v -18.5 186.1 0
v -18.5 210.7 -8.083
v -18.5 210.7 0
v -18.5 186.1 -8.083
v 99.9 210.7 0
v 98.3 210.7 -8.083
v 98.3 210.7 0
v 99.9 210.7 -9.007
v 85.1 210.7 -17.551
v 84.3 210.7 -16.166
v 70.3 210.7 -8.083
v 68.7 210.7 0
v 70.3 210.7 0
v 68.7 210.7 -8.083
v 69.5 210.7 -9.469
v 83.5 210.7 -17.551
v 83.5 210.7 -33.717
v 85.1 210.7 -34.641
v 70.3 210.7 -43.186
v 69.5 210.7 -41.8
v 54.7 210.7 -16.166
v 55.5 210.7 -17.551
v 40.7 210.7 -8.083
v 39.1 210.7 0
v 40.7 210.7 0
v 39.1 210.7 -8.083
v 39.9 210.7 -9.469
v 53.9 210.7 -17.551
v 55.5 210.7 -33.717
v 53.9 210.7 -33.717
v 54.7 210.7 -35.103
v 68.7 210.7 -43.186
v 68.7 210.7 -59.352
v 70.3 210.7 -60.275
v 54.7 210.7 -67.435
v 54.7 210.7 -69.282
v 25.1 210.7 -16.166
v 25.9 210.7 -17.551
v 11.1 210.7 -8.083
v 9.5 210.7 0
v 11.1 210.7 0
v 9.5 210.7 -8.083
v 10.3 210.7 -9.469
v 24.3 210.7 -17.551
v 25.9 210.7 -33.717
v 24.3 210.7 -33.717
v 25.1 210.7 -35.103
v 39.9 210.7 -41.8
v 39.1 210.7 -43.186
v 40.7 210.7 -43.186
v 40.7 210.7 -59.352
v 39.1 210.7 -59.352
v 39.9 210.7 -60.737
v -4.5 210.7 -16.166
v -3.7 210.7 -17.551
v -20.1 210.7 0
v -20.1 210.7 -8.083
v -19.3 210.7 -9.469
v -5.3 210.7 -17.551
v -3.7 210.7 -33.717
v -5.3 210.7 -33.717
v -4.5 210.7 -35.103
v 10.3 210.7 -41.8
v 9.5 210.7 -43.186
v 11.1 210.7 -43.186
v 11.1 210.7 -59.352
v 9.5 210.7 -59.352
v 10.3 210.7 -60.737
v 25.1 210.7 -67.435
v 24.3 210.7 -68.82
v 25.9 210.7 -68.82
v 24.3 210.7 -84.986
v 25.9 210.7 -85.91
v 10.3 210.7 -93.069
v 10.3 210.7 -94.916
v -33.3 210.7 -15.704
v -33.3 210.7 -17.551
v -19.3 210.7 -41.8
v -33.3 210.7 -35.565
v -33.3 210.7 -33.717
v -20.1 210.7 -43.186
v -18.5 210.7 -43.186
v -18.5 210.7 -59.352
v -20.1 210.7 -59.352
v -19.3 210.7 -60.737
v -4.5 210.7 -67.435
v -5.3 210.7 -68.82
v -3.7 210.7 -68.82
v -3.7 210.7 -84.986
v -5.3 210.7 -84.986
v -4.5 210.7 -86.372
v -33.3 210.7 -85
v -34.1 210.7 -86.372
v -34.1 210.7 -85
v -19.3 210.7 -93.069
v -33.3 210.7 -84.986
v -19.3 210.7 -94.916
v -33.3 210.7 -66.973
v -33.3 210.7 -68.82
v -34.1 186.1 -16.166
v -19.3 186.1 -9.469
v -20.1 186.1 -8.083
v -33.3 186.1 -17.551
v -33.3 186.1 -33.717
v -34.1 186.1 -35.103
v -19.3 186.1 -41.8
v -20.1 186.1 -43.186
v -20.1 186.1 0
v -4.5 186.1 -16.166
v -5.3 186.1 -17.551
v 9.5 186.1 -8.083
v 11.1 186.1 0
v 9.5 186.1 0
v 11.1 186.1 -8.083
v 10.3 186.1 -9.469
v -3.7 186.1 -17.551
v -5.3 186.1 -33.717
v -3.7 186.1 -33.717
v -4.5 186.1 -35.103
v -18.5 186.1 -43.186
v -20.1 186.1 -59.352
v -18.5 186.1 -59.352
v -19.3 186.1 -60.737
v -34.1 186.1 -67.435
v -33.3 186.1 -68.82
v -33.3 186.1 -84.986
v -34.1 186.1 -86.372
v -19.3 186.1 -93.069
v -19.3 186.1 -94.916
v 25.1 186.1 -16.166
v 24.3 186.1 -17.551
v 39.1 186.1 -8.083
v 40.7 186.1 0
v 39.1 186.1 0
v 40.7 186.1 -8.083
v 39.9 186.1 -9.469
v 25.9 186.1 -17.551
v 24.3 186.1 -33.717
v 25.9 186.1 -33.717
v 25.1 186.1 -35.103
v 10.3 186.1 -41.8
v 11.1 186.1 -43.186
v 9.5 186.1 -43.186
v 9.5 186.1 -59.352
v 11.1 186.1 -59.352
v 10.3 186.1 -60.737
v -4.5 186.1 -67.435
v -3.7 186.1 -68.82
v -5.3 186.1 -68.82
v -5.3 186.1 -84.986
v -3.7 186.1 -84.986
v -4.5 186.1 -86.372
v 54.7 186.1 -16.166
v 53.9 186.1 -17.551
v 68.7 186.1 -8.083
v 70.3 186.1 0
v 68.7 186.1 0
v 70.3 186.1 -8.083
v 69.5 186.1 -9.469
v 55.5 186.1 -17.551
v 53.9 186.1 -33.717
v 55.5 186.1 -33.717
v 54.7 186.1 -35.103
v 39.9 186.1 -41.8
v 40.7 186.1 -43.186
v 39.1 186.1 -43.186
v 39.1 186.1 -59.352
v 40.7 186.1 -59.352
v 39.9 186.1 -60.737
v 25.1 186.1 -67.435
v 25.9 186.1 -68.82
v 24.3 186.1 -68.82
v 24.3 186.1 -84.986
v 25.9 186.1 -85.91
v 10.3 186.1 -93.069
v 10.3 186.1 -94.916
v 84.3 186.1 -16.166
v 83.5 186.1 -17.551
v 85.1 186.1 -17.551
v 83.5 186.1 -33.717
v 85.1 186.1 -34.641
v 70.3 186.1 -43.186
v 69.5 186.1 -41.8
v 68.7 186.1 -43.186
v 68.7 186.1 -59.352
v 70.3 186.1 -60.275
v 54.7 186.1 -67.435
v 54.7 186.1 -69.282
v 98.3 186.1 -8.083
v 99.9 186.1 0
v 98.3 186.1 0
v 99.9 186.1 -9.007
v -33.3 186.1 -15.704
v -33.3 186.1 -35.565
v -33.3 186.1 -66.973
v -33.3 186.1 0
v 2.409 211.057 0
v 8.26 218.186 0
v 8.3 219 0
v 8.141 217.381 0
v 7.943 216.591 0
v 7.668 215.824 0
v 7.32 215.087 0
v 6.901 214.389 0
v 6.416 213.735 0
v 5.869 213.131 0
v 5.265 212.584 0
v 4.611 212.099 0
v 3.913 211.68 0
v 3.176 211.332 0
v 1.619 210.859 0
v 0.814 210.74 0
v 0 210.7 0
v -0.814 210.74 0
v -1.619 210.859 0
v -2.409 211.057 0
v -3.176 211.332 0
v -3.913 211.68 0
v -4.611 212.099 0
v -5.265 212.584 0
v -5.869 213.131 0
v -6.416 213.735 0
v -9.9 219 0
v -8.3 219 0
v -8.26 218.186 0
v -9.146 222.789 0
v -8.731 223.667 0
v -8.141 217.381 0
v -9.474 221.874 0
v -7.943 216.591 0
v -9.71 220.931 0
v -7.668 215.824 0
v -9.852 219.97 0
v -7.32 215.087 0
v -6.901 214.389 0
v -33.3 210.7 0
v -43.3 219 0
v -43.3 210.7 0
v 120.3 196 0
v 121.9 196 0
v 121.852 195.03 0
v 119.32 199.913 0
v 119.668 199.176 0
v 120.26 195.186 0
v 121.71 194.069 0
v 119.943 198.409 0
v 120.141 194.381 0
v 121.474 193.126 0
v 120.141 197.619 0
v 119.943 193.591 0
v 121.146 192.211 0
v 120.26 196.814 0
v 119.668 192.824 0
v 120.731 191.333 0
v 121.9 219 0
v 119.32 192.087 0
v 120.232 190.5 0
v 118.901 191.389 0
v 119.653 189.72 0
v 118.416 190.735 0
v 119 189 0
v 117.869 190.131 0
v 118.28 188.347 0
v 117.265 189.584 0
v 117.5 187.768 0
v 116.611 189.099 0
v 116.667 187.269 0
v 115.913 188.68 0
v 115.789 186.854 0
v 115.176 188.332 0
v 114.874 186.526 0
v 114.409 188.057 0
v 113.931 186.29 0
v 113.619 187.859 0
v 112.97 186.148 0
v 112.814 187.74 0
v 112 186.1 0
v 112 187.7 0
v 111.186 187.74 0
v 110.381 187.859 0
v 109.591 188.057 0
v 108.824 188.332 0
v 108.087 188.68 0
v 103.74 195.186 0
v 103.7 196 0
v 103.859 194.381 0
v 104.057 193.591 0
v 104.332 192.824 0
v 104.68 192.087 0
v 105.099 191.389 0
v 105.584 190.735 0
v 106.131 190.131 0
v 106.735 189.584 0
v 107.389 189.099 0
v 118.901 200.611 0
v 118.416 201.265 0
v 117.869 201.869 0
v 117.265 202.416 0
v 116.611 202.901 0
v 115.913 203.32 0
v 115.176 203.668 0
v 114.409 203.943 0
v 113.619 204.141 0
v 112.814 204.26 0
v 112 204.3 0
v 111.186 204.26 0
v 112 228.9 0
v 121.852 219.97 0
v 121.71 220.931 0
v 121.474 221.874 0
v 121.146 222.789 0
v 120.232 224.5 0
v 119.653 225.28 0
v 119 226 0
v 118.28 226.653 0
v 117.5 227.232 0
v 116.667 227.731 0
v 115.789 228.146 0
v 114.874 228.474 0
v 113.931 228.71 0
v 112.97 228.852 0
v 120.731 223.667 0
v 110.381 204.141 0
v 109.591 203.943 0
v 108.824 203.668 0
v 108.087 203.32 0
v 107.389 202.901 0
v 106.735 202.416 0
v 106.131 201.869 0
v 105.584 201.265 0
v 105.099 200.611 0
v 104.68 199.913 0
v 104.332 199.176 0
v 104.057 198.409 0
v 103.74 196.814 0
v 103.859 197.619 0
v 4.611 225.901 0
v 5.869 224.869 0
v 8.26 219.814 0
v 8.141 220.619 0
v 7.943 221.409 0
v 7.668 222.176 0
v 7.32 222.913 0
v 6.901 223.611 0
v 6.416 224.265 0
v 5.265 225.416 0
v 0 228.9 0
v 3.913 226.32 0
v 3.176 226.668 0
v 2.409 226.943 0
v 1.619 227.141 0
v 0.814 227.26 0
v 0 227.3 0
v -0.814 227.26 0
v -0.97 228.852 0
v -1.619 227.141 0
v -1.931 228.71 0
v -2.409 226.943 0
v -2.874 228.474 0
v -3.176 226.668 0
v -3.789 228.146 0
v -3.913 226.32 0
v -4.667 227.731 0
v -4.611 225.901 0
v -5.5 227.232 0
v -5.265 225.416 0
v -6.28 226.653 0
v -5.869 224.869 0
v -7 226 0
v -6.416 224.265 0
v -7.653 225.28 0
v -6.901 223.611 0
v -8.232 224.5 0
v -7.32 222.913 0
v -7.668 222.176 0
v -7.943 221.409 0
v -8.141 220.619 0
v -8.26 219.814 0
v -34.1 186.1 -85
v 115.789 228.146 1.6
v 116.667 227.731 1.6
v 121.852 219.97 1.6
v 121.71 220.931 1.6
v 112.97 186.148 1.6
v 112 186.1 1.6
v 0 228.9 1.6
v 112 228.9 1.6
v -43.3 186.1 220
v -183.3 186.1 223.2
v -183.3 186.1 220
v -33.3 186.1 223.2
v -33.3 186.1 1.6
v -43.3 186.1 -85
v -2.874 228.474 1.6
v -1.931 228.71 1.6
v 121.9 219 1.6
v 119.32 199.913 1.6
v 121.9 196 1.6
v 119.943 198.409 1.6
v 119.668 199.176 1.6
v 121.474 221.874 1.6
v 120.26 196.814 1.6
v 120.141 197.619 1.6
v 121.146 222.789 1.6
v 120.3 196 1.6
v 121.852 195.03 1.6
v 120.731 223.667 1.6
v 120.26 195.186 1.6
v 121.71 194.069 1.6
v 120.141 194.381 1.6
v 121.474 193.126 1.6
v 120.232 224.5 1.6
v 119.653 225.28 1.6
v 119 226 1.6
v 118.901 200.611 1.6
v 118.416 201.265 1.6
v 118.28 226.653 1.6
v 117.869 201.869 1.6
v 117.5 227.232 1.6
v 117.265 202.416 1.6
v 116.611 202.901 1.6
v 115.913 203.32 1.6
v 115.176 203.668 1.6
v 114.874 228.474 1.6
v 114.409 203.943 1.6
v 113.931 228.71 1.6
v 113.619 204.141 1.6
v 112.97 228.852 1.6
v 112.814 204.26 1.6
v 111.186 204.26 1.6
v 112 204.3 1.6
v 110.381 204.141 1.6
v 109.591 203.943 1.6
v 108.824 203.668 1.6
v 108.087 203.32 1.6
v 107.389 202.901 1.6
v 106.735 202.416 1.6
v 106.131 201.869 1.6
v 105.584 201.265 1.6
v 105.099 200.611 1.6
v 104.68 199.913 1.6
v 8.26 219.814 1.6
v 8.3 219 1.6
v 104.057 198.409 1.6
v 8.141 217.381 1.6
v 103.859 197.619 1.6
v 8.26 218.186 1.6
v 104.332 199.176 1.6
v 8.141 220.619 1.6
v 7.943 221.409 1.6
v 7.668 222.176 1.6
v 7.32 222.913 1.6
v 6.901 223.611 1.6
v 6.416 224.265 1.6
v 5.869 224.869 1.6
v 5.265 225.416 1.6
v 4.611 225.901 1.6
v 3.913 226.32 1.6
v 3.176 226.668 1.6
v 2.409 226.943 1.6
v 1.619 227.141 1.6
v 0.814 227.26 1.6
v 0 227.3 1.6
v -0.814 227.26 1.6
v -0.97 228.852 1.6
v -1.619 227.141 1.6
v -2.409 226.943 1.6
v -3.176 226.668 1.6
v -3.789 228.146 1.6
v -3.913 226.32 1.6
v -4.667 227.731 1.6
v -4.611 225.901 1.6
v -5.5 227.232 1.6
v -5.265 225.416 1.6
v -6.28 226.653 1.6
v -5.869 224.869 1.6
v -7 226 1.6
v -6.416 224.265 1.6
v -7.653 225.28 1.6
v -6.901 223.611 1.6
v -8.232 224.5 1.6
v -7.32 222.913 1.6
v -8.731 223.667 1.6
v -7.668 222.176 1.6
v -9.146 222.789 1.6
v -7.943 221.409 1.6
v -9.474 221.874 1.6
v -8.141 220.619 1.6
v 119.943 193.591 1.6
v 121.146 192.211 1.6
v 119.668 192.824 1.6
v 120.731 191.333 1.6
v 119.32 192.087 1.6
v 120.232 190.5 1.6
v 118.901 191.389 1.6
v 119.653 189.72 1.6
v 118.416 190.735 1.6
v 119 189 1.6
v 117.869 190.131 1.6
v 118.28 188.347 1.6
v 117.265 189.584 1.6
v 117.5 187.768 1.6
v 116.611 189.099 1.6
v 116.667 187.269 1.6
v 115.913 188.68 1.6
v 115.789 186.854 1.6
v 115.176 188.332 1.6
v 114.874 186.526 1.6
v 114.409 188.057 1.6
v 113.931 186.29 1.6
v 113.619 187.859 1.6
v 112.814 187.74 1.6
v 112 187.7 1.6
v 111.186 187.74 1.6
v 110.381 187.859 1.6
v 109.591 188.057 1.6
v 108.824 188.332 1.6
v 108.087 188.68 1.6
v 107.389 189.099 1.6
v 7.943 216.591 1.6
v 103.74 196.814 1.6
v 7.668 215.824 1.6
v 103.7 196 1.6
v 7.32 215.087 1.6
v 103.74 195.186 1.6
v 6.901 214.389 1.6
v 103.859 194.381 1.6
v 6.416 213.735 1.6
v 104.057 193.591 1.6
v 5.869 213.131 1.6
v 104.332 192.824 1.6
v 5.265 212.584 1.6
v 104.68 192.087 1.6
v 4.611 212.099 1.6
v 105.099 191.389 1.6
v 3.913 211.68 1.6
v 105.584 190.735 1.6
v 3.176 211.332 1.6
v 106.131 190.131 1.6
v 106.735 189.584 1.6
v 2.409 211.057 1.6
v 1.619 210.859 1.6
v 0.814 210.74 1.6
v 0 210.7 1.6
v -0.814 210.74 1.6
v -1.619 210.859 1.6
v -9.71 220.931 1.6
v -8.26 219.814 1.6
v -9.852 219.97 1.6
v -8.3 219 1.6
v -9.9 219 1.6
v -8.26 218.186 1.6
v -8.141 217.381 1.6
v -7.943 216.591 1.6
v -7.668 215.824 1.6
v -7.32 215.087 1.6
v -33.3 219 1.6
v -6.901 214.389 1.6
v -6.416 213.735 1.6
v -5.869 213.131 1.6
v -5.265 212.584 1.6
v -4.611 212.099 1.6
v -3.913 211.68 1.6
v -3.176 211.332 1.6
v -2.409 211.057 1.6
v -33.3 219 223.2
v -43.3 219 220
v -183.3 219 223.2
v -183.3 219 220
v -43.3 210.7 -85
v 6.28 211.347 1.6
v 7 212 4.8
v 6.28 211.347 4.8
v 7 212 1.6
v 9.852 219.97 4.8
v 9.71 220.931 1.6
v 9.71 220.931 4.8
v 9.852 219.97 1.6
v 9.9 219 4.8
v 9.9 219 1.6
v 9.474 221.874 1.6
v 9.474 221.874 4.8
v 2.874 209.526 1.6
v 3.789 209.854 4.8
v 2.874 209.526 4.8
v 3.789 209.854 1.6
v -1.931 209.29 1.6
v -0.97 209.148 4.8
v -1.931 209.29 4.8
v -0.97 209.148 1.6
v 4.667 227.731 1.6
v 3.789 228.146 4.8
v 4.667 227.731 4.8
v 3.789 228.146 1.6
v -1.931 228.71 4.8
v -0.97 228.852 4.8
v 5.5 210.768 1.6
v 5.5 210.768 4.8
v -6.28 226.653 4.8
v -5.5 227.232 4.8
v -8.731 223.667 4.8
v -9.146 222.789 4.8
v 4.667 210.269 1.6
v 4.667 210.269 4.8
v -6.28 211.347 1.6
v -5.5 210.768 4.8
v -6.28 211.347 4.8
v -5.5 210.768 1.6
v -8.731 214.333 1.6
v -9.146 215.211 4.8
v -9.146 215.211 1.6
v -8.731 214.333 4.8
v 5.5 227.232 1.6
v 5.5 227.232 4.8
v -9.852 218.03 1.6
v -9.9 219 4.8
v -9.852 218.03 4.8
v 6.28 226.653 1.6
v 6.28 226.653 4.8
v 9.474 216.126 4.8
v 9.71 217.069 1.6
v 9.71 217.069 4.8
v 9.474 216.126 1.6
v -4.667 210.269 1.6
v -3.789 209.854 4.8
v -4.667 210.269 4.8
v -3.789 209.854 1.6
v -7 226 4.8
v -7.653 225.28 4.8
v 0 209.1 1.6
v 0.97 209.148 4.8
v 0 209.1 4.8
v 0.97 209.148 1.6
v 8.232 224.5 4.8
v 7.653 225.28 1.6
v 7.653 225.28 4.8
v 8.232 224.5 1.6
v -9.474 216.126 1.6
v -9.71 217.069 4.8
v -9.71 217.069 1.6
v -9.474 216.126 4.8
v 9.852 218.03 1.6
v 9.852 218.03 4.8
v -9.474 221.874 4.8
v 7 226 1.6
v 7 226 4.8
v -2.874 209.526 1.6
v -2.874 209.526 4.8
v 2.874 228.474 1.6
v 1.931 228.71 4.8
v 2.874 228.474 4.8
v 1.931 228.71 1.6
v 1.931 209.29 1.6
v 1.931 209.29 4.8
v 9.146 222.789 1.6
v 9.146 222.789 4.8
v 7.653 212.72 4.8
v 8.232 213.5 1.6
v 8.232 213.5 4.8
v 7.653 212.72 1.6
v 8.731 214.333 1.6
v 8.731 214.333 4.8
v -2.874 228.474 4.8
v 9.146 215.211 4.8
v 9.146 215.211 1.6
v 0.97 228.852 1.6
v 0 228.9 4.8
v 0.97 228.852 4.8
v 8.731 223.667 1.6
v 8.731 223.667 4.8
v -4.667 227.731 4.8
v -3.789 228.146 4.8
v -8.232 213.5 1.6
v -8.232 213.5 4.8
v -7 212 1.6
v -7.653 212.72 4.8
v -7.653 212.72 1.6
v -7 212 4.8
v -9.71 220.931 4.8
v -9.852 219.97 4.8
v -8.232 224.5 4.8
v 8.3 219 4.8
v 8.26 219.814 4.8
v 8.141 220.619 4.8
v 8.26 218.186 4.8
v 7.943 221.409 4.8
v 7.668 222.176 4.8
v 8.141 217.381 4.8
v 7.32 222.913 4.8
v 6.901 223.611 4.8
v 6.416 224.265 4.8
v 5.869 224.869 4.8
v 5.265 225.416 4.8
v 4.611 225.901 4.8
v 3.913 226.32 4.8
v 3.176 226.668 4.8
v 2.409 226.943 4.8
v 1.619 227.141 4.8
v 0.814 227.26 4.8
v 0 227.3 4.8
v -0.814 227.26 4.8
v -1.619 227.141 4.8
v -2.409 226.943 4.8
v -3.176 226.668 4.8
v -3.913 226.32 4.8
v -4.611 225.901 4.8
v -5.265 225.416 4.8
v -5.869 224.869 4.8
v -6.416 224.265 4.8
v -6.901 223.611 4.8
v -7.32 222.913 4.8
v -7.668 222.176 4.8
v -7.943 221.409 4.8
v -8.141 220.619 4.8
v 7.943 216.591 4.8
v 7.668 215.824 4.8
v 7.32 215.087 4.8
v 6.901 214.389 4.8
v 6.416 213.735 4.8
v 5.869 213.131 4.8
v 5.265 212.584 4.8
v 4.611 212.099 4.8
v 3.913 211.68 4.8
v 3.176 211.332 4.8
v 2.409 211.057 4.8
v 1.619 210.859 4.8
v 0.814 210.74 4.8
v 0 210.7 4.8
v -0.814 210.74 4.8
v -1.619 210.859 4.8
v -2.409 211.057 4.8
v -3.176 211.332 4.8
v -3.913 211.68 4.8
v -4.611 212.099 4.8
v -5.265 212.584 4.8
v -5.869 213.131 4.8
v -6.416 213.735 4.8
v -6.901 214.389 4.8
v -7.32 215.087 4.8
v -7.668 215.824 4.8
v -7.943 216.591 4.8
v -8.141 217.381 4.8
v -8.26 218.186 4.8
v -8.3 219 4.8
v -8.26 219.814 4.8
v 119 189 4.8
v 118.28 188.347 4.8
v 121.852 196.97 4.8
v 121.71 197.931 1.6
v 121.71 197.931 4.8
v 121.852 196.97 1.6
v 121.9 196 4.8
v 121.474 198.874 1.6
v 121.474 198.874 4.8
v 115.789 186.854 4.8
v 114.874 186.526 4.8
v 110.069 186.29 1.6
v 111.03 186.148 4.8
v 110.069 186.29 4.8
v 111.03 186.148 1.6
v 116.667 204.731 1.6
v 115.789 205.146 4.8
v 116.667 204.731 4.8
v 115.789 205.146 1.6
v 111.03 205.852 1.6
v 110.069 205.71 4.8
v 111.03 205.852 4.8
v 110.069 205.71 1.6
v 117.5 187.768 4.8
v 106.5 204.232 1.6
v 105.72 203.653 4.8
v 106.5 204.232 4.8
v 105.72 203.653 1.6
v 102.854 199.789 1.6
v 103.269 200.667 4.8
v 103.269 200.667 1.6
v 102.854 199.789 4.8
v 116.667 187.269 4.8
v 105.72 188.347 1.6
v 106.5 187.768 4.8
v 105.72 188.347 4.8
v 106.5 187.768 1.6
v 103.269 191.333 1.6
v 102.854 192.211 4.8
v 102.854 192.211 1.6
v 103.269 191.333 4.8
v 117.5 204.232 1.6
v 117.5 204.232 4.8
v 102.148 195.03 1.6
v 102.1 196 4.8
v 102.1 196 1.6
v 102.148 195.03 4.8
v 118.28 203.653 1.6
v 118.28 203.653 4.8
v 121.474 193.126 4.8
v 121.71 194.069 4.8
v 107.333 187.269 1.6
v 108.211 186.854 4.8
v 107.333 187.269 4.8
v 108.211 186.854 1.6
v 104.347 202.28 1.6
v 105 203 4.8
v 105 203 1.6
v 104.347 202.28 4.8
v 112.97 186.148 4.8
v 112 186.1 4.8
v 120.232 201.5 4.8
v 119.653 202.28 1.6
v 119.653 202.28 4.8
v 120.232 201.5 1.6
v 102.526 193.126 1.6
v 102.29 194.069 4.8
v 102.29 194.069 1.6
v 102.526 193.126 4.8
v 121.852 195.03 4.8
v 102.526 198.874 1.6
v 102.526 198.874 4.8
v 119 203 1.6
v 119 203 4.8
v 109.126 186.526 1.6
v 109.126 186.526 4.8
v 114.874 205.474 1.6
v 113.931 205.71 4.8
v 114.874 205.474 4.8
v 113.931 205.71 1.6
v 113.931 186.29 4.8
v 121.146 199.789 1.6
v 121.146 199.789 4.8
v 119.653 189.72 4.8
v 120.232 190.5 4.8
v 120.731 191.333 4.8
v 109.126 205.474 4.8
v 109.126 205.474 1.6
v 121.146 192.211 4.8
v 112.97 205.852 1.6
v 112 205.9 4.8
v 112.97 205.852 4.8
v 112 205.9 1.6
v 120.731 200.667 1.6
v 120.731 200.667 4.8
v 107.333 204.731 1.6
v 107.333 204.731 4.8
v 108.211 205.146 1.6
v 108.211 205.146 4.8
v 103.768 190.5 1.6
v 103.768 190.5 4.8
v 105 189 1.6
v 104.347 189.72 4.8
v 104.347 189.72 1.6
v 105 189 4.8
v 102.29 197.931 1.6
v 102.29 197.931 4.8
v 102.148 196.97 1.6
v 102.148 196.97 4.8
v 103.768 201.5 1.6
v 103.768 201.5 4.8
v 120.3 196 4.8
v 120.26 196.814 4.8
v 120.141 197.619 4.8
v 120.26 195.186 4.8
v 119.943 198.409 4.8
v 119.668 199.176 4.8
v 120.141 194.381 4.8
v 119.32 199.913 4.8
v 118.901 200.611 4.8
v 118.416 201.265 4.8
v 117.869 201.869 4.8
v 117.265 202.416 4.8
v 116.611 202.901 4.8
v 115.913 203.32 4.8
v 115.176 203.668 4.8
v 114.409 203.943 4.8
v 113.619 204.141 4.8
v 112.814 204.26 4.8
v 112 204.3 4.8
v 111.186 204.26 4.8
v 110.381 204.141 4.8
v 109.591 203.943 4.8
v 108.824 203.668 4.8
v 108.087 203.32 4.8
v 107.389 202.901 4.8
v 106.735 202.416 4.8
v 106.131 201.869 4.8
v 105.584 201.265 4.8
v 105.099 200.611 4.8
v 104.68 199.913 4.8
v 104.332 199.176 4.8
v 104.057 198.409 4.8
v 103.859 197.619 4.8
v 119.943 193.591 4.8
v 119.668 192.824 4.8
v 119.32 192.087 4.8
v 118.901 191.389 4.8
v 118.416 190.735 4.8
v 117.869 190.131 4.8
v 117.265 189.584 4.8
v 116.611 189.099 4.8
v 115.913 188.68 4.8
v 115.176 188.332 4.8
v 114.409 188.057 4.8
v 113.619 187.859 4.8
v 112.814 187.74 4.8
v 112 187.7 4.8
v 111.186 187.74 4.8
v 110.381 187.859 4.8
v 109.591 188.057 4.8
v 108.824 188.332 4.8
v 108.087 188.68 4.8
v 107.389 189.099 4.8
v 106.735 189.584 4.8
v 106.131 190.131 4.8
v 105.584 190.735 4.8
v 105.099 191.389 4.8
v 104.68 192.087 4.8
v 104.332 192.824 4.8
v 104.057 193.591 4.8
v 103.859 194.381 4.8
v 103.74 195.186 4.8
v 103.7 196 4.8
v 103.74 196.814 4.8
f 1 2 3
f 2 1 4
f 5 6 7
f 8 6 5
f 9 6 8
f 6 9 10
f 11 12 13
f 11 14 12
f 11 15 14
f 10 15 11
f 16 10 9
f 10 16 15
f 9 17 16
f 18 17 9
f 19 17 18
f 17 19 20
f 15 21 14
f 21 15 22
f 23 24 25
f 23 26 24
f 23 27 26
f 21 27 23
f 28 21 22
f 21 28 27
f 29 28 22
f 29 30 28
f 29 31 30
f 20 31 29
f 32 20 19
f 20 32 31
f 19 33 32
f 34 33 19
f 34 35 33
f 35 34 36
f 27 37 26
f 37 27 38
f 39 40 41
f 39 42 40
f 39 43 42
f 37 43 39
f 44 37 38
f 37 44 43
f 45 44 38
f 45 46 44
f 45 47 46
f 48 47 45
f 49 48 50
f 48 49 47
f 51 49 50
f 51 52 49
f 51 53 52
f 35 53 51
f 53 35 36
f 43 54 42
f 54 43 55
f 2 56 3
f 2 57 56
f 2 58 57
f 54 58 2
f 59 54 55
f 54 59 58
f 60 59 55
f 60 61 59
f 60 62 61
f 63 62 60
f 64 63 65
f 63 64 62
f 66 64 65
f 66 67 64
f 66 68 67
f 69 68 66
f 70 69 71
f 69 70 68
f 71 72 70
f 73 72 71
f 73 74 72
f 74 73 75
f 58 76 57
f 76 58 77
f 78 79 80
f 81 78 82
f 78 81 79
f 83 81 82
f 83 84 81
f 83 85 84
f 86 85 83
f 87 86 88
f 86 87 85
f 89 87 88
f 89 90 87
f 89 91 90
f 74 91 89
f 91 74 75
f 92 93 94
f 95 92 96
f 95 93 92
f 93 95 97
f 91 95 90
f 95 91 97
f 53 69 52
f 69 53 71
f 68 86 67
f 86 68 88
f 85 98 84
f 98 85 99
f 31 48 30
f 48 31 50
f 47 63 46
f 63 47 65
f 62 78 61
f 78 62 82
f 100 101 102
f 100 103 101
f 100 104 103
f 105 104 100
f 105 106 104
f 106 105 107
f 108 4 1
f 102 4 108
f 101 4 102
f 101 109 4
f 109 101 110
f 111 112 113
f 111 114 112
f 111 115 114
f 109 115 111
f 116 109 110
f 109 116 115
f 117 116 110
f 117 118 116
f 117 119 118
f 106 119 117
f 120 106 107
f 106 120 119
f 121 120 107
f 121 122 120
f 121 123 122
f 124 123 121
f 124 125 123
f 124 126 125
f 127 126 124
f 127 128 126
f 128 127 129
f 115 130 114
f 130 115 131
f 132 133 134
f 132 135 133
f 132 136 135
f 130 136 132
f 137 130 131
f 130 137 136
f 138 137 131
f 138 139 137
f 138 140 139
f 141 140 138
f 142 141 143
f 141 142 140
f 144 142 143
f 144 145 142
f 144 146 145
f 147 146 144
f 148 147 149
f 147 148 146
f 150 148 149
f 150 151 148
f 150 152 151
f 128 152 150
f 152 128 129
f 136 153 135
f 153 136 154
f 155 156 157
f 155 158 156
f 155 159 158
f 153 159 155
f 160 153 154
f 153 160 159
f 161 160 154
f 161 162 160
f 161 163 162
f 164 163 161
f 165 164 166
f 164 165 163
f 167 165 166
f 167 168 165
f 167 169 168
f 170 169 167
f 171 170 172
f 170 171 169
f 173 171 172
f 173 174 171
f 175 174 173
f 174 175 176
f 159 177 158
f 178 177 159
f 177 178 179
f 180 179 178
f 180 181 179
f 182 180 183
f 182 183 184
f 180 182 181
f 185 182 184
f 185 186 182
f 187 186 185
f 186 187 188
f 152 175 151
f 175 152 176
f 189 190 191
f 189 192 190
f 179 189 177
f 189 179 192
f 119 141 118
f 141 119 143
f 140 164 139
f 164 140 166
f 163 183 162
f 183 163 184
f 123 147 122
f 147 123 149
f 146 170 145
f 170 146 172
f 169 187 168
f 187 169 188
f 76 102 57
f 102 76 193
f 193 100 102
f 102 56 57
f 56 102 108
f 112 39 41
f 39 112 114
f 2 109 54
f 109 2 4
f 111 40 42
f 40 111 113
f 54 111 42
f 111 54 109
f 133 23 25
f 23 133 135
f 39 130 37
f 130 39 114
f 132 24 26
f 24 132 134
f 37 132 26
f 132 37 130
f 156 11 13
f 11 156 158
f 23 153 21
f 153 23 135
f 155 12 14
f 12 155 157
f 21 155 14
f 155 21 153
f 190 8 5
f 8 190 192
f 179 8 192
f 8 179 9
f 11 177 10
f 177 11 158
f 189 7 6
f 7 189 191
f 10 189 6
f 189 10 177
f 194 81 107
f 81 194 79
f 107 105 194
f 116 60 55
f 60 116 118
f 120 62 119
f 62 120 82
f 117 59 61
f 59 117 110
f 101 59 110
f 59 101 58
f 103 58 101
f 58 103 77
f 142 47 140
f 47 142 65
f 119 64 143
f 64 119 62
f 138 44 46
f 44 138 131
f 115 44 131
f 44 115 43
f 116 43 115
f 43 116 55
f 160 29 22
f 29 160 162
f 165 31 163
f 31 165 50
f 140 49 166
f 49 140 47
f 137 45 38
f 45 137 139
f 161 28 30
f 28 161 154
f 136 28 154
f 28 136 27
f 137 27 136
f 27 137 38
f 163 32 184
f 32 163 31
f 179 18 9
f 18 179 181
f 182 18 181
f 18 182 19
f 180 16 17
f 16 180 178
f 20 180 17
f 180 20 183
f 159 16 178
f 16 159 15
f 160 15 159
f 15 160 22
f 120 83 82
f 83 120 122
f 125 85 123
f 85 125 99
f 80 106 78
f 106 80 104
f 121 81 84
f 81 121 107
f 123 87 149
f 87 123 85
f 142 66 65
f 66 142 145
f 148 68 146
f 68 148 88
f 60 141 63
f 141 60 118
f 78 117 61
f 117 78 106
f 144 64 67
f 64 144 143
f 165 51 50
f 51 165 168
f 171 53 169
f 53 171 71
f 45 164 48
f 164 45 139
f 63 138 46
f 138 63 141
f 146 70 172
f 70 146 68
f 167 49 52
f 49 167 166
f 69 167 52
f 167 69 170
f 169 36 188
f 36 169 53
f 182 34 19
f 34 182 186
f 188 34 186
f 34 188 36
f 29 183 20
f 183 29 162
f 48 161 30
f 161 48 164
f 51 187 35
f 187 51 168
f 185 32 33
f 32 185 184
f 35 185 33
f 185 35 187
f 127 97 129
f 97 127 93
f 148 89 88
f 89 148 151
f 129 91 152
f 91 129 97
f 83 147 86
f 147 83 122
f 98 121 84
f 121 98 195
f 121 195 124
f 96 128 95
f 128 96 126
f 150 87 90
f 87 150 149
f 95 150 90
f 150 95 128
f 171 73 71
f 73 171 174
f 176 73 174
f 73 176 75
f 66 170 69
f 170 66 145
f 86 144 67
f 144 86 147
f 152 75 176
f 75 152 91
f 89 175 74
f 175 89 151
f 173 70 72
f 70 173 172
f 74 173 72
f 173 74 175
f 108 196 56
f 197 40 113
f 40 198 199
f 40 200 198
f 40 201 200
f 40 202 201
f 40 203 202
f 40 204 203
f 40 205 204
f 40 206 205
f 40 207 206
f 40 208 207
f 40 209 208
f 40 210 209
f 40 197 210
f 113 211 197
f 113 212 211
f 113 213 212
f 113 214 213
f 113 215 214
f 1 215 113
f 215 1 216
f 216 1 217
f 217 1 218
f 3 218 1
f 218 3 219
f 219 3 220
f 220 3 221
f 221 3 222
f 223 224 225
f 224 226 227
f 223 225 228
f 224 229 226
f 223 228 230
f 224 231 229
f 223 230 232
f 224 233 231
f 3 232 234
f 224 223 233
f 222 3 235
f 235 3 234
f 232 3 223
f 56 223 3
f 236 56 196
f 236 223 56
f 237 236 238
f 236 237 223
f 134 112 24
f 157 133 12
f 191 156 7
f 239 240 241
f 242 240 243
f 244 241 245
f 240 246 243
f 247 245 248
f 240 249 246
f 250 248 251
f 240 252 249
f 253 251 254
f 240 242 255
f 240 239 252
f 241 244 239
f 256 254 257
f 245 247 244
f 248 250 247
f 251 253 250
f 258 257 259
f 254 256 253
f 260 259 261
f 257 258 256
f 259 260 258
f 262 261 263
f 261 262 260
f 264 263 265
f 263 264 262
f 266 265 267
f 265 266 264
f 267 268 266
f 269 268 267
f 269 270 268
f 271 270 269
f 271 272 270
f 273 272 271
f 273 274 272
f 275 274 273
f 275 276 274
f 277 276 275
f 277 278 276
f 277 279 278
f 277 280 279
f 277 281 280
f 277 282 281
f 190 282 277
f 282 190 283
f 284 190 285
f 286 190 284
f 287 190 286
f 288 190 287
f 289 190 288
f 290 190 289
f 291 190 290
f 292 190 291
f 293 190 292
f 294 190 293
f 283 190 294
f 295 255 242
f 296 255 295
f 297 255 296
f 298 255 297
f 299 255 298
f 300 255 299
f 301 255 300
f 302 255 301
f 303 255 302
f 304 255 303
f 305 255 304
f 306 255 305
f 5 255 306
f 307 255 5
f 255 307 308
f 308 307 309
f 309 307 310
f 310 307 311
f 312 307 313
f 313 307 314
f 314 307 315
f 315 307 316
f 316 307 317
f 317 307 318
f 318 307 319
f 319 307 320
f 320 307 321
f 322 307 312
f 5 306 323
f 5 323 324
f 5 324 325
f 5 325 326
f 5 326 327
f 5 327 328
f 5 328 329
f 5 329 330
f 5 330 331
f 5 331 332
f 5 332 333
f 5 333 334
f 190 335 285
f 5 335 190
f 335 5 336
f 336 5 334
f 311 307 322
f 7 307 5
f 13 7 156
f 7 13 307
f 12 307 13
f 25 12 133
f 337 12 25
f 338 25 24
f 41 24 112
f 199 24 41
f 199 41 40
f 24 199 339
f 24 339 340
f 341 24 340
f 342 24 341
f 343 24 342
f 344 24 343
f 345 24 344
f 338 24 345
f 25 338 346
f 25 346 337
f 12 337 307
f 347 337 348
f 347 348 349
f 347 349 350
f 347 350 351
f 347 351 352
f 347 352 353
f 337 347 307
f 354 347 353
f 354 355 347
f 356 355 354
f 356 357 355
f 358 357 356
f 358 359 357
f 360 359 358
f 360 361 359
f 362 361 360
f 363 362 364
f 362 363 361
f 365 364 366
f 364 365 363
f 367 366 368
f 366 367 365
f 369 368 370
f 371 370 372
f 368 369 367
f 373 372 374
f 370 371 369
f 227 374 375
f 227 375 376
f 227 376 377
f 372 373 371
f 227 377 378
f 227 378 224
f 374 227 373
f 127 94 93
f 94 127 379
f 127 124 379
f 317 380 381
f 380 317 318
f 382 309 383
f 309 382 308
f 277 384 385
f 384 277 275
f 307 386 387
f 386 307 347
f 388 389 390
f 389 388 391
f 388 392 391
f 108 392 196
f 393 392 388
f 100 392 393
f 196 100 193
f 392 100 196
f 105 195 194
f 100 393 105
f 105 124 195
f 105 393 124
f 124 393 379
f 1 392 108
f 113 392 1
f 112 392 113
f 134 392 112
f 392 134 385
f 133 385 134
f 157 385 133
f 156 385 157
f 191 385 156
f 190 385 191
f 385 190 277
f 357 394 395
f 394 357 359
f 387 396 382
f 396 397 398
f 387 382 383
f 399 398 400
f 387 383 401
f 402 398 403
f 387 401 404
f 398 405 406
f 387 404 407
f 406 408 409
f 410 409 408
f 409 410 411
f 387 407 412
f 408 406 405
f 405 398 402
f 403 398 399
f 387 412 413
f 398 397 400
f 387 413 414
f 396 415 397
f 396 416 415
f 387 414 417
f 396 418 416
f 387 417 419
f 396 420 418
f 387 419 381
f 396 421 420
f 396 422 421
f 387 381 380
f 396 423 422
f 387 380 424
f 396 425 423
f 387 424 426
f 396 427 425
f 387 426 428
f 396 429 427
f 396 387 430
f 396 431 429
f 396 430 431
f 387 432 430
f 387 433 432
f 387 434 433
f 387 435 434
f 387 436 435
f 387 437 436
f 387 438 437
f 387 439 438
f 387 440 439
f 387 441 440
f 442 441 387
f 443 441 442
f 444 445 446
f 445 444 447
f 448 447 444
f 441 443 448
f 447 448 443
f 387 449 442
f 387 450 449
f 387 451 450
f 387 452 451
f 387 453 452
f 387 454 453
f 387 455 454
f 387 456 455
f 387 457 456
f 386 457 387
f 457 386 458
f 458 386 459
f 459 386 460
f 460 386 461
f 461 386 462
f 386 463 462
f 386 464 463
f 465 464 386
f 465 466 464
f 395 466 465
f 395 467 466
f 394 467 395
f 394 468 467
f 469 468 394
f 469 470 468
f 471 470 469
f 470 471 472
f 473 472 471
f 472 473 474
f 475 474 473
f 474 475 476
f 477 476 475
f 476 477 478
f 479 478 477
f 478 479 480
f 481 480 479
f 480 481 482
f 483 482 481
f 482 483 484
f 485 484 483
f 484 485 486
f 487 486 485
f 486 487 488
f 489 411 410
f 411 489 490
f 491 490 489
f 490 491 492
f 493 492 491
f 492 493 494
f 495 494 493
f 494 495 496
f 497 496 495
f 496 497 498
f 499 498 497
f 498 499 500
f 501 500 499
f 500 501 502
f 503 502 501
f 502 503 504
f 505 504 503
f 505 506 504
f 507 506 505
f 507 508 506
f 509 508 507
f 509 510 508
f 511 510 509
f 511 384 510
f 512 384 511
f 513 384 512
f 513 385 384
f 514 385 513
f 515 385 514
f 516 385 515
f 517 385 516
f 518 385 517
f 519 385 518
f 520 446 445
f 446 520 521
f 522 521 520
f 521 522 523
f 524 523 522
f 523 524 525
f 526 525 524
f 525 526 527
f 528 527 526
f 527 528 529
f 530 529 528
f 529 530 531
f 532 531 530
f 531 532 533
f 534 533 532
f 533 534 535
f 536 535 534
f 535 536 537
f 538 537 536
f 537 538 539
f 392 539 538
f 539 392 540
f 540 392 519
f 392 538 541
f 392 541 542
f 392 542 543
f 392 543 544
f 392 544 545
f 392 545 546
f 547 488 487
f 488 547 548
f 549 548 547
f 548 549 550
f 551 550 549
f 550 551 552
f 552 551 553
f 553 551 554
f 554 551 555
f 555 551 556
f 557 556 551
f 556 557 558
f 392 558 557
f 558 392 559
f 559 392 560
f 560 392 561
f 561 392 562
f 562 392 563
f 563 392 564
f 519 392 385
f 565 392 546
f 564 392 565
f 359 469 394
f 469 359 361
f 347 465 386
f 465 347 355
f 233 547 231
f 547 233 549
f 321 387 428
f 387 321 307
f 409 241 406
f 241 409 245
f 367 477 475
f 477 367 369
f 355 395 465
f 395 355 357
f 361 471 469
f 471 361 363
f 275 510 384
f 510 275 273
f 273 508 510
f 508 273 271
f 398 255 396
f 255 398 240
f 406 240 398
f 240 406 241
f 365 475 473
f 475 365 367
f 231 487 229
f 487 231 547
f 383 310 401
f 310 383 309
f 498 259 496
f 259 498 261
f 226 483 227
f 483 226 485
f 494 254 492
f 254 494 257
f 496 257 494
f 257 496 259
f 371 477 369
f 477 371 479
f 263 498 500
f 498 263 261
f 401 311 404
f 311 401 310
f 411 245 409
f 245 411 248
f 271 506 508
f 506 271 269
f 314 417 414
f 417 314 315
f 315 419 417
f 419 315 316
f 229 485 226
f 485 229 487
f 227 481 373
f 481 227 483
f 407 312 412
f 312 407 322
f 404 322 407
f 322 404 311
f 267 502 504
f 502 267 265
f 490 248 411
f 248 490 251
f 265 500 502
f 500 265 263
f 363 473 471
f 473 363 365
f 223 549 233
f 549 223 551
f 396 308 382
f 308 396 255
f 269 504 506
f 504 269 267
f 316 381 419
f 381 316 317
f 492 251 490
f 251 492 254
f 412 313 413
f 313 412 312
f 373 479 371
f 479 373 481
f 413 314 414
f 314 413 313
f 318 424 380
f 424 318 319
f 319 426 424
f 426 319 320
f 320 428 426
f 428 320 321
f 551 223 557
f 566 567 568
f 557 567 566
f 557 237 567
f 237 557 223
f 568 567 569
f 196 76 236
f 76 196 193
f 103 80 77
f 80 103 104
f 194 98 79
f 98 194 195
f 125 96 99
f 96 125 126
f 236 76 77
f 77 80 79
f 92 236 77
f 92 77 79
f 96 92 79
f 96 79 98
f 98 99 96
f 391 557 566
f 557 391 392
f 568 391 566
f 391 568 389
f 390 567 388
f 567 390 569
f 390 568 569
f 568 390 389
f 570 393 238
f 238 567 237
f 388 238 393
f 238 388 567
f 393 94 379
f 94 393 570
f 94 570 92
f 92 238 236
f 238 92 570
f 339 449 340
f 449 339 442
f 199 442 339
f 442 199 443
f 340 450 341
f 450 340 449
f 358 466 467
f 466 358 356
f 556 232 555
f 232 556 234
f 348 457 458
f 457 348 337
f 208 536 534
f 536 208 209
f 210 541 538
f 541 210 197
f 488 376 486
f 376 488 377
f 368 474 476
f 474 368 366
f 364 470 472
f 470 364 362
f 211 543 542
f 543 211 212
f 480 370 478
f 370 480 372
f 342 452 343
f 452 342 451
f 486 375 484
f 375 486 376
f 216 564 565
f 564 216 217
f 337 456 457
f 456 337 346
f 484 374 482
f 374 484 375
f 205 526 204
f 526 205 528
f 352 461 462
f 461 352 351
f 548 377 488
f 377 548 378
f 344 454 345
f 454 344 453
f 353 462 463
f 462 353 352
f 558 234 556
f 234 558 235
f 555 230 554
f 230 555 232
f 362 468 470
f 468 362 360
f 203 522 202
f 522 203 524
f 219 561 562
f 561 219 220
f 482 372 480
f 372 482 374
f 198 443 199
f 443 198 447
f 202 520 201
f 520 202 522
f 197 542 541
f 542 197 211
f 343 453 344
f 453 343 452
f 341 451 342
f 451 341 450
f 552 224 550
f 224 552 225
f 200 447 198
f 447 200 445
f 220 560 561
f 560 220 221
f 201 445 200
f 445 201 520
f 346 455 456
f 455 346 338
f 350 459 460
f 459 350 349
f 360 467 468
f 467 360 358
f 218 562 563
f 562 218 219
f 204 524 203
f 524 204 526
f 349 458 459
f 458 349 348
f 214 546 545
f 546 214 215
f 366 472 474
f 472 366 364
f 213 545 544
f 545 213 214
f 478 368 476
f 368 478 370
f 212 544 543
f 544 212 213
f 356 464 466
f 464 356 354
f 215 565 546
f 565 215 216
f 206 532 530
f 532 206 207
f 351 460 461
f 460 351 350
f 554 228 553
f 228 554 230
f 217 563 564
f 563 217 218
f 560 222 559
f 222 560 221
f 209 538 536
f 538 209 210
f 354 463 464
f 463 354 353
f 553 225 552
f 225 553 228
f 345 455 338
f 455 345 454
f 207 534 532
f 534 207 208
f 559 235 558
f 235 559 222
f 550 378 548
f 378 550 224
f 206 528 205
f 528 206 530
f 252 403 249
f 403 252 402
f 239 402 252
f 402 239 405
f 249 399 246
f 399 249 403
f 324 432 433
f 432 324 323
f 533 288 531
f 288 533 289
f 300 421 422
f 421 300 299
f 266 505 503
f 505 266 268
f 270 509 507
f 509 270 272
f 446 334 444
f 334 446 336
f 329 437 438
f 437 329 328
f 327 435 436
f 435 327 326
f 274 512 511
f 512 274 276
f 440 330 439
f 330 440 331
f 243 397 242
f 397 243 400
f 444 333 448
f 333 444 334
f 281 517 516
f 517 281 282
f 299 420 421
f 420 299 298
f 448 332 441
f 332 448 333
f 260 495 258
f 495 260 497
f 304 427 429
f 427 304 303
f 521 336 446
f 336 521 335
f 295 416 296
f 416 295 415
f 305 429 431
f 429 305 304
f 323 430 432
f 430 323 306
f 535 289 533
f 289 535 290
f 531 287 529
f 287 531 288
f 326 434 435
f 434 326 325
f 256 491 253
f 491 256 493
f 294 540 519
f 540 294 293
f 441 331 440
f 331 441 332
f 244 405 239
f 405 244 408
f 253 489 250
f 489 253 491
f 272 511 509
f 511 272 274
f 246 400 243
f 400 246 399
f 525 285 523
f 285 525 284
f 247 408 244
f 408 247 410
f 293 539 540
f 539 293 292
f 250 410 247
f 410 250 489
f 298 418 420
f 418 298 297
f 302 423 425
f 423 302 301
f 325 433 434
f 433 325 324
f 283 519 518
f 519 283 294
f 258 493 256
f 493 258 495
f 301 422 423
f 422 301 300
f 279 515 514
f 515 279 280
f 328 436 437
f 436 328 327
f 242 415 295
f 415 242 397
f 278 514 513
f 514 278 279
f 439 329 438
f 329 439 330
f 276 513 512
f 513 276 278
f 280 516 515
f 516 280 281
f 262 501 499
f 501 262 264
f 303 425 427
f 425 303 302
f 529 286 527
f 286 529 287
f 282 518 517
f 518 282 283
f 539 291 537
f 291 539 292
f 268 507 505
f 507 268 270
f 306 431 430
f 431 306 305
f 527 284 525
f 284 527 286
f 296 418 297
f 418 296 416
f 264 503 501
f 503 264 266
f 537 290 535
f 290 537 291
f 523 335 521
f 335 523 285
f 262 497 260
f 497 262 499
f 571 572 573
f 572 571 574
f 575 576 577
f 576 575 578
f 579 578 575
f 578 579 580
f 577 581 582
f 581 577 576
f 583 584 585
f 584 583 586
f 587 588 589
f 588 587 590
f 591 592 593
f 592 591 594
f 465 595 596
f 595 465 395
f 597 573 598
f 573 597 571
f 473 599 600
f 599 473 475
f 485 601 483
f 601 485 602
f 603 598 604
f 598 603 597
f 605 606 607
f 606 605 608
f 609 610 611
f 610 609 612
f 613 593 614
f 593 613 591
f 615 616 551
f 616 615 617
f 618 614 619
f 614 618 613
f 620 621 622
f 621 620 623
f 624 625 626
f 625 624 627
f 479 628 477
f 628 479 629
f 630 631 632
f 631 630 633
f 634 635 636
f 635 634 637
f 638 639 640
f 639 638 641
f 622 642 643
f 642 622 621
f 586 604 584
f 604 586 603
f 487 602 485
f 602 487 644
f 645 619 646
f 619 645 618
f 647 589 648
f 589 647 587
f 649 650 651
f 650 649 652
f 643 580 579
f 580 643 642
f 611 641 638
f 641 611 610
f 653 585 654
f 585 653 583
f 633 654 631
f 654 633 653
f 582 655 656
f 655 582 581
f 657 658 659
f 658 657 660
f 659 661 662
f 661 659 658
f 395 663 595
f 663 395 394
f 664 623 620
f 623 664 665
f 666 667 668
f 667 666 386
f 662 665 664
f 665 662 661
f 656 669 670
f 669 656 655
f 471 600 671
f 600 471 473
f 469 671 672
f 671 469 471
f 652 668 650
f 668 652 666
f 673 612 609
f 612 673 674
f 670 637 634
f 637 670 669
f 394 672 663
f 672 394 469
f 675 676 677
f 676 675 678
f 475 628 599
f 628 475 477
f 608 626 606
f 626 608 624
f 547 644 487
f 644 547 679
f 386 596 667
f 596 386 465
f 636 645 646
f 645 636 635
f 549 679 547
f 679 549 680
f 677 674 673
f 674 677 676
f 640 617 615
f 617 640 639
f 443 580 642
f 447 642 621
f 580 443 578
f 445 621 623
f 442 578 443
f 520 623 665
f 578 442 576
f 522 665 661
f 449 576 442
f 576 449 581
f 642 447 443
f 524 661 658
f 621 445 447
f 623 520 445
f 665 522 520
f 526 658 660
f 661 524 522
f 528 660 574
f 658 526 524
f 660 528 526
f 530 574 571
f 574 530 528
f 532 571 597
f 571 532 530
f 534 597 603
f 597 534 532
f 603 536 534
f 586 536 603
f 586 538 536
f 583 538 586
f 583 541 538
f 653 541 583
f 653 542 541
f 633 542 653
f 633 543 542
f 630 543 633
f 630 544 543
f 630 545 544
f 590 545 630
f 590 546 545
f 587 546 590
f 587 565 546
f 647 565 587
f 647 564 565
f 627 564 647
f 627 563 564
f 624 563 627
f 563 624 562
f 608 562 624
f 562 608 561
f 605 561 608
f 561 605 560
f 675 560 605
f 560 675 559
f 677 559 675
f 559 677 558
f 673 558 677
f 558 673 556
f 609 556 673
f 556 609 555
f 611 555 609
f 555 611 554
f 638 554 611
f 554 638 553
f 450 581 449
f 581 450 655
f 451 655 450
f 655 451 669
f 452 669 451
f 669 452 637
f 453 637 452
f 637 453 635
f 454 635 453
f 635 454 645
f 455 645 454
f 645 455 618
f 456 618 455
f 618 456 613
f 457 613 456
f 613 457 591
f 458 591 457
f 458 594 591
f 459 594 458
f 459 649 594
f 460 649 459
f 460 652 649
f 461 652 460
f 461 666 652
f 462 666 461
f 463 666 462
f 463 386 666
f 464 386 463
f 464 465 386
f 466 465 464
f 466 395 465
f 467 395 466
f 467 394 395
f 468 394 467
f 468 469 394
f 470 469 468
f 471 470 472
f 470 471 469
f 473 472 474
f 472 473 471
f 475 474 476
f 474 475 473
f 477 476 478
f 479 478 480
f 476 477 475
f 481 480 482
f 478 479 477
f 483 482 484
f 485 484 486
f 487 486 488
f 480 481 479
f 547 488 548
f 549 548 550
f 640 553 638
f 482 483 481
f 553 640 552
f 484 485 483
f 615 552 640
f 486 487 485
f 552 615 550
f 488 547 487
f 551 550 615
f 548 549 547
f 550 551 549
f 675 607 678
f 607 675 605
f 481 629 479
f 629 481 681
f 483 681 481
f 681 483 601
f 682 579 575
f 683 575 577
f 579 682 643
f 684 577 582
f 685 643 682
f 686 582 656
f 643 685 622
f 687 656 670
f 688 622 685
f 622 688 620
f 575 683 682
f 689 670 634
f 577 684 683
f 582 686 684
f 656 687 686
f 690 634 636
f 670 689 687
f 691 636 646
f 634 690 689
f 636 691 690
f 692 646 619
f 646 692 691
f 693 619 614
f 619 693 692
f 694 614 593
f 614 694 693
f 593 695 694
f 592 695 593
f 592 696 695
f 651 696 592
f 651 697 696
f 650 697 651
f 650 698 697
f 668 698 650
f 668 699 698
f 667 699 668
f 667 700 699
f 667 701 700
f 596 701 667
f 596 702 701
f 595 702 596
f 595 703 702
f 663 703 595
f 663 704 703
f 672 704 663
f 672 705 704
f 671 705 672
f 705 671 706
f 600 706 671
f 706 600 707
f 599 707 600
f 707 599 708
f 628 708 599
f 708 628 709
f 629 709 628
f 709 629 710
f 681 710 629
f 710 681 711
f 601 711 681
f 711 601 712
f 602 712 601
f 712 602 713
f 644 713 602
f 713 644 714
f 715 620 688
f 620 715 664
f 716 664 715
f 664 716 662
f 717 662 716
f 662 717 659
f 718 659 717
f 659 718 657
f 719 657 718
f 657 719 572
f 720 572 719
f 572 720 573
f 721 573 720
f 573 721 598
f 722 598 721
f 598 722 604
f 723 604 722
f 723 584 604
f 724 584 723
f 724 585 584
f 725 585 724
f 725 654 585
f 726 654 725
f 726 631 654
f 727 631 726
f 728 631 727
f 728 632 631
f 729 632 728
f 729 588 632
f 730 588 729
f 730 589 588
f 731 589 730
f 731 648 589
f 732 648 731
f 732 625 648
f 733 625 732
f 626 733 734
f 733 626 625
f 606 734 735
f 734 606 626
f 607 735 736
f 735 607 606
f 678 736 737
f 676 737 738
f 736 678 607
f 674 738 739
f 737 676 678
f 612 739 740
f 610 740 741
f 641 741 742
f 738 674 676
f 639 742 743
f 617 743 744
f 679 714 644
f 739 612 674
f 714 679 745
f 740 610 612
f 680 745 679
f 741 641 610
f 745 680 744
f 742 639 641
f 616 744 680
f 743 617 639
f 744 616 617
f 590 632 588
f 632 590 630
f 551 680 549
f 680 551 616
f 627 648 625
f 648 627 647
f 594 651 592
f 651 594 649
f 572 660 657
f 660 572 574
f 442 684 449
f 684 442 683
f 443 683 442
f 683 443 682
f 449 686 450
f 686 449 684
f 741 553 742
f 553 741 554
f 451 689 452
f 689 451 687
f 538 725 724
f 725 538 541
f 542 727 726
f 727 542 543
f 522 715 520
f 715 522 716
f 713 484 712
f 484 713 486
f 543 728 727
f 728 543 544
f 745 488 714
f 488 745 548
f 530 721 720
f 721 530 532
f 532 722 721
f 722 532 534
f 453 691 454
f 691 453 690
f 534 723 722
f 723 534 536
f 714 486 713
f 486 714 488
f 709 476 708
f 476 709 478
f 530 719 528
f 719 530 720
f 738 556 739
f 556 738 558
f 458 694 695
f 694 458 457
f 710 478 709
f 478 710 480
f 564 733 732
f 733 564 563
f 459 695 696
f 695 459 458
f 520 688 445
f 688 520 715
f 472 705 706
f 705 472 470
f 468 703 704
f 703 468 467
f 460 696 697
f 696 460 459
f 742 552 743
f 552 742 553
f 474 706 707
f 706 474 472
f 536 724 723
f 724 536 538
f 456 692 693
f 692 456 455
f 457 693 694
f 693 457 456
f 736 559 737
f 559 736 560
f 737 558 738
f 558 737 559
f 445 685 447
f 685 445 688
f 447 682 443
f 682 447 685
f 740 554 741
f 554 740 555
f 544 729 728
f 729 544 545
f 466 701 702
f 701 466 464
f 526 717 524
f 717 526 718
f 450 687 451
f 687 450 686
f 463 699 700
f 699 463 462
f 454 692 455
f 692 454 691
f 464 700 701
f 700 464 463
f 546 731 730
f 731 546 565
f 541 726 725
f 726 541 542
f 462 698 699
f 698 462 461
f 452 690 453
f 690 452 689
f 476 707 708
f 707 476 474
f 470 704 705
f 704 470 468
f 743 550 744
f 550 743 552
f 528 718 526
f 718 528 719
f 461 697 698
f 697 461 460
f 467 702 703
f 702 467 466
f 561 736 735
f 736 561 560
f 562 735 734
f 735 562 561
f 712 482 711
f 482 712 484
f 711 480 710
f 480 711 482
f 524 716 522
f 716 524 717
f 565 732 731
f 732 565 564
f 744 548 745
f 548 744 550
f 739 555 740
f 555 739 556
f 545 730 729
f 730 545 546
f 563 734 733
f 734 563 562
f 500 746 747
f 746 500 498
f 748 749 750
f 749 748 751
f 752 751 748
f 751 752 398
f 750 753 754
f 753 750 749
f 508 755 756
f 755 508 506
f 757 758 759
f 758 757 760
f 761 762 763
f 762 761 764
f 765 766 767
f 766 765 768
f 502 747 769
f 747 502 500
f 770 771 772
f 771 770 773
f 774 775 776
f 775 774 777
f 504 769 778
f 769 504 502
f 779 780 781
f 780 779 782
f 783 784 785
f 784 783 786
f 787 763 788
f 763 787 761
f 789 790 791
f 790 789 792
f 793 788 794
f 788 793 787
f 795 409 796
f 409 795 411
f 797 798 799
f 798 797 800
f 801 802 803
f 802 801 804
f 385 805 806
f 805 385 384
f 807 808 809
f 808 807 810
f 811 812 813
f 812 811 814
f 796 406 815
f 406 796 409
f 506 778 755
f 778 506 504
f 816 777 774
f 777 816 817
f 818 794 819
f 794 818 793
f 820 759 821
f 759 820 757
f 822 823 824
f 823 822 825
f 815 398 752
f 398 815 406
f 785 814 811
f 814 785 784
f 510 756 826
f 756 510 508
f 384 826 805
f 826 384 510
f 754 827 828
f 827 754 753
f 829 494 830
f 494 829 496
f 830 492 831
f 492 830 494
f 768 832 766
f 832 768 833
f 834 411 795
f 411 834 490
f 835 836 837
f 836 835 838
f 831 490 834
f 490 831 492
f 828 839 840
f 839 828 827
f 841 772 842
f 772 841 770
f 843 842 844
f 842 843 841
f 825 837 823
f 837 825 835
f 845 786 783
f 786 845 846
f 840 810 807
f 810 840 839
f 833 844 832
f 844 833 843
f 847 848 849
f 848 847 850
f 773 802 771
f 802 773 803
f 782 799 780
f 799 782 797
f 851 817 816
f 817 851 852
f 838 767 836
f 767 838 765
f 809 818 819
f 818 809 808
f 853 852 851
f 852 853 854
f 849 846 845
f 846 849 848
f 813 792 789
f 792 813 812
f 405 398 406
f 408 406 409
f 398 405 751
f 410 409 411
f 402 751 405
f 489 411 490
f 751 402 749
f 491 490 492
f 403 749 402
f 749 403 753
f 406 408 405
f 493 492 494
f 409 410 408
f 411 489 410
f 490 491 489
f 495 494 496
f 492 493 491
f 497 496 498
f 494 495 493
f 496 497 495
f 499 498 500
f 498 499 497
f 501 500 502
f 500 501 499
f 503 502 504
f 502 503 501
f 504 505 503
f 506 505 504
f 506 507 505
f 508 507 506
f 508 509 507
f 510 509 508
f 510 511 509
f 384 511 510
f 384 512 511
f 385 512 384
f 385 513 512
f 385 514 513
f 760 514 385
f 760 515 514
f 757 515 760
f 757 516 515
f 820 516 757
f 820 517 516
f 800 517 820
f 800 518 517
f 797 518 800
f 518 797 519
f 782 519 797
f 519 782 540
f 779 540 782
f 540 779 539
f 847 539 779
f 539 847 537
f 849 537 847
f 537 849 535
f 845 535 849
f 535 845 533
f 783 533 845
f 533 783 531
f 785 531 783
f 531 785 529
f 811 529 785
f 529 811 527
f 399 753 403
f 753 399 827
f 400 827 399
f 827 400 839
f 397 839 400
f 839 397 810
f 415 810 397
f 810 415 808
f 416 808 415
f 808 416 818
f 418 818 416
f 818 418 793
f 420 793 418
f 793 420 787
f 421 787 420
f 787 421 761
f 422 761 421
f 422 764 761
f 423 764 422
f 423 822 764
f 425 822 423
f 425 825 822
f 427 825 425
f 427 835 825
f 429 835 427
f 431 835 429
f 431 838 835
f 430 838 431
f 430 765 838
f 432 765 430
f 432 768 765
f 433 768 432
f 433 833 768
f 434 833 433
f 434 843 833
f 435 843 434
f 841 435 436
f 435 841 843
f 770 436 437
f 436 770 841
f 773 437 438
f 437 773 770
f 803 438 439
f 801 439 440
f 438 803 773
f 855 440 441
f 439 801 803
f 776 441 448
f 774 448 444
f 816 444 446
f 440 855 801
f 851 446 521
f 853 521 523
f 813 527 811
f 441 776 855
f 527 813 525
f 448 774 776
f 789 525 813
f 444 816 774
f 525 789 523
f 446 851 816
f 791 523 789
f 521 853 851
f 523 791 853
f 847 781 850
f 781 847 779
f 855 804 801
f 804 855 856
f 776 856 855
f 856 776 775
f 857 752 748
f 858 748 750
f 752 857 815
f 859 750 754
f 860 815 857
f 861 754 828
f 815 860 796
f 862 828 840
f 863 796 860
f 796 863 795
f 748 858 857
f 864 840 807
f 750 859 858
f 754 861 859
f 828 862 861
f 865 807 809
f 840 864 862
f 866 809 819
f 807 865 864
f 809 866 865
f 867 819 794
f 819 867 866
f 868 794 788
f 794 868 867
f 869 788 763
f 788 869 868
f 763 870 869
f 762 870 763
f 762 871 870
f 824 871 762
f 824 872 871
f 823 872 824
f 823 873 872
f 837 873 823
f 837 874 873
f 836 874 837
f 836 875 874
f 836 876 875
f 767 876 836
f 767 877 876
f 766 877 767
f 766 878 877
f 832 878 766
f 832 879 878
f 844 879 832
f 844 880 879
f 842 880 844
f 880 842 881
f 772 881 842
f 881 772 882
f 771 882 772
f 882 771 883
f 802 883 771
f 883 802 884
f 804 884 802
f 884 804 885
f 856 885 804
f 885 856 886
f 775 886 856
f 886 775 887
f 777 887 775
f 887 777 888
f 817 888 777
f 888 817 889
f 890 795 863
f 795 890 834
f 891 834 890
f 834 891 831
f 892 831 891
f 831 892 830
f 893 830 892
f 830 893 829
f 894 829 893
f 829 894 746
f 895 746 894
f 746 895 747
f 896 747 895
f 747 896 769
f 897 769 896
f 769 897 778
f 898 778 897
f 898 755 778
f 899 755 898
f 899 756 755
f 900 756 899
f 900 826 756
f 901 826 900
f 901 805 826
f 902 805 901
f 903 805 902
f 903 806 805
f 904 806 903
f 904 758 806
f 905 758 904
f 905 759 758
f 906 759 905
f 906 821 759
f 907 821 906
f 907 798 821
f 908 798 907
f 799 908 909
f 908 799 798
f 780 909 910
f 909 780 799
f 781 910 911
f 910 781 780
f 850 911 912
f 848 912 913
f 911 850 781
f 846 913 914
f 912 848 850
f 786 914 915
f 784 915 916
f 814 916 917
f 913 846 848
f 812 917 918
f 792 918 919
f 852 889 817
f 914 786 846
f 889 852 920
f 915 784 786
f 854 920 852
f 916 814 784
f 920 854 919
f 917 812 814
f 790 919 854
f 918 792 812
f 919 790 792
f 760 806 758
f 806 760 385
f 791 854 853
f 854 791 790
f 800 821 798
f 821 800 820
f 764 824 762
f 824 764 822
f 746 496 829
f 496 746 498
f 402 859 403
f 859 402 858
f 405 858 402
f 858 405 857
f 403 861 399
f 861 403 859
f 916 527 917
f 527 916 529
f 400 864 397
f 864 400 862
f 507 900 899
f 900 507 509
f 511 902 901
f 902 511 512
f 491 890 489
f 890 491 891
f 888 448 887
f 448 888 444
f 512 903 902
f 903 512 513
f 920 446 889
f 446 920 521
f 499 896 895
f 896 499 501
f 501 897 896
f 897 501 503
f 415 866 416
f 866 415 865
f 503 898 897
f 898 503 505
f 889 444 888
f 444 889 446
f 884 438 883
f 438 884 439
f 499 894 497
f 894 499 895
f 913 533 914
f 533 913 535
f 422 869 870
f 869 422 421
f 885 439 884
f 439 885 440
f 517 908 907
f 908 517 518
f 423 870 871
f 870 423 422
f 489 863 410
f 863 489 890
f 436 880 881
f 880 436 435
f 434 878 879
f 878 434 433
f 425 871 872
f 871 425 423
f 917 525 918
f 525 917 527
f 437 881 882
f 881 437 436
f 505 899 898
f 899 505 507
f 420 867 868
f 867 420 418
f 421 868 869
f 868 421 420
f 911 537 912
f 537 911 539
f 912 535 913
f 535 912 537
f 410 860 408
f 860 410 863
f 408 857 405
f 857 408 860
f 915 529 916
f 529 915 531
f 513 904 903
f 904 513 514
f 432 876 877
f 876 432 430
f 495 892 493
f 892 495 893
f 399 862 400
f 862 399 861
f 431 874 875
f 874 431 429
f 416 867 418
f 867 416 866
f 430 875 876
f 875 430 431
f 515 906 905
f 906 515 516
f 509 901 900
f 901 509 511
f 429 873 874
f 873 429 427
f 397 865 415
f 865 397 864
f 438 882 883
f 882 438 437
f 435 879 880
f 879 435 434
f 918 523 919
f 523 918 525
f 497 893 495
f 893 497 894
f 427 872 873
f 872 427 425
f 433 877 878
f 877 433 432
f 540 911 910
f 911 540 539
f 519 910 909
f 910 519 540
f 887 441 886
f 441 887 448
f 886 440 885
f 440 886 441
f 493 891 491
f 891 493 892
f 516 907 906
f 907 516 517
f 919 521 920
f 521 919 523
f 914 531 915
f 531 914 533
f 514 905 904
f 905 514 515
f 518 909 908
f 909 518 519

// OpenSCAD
lw=0.4;
lh=0.28;

wt=lw*4;

holeR=8.3;



caseH=220;
caseD=25;


holePositions = [
  [105,0],
  [1,0], 
  [0,219],
  [112,196], 
];

cxd=holePositions[3][0]-holePositions[2][0];
cyd=holePositions[2][1]-holePositions[3][1];

topArmL=150;
armW=cyd+holeR+wt;
bottomArmH=85;


hexR=14;

gridCells = [
  [0,0],[0,1],[0,2],[0,3],[0,4], 
  [1,0],[1,1],[1,2],[1,3],
  [2,0],[2,1],[2,2],[2,3],
  [3,0],[3,1],
  // [4,0],[4,1],
  // [5,0],
];

$fn=64;

// holeTest();
// shelf1();
shelf2();


module hexSupport() {
  intersection() {
    hexGrid(hexR,wt,armW-holeR,gridCells);
    cube([200,200,armW-holeR]);
  }
}


module shelf1() {
    difference() {
      shelf();
      translate([holePositions[0][0], holePositions[0][1], 0]) hole();
      translate([holePositions[1][0], holePositions[1][1], 0]) hole();
    }
    translate([holePositions[0][0], holePositions[0][1], wt]) holeRing();
    translate([holePositions[1][0], holePositions[1][1], wt]) holeRing();
}

module shelf2() {
    difference() {
      translate([0,holePositions[2][1],0]) mirror([0,1,0]) shelf();
      translate([holePositions[2][0], holePositions[2][1], 0]) hole();
      translate([holePositions[3][0], holePositions[3][1], 0]) hole();
    }
    translate([holePositions[2][0], holePositions[2][1], wt]) holeRing();
    translate([holePositions[3][0], holePositions[3][1], wt]) holeRing();
}

module shelf() {
  
  hull() {
    cylinder(r=holeR+wt,h=wt);
    translate([cxd,cyd,0]) cylinder(r=holeR+wt,h=wt);
    translate([cxd,0,0]) cylinder(r=holeR+wt,h=wt);
    translate([-holeR-wt,cyd,0]) cube([holeR+wt,holeR+wt,wt]);
  }
  translate([-holeR-wt-caseD,0,0]) cube([caseD,armW,wt]);
  
  translate([-holeR-wt-caseD-topArmL+wt,0,caseH]) cube([topArmL,armW,wt*2]);

  armT=10;
  translate([-holeR-armT-caseD,0,0]) cube([armT,armW,caseH]);
  translate([-holeR-armT-caseD,holeR,-bottomArmH]) cube([armT,armW-holeR,bottomArmH]);

  translate([-holeR-caseD-wt/2,armW,0]) rotate([90,90,0]) hexSupport();

}




module holeTest() {
  scale([1,1,0.5]) holePositions() holeRing();
  
  difference() {
    testPlate() cylinder(r=4,h=lw*2);
    holePositions() hole();
  }

}


module testPlate() {
  holeCount = len(holePositions);
  for (i = [ 0 : holeCount - 1 ] ) {
    i2 = (i+1)%holeCount;
    hull() {
      translate([holePositions[i][0], holePositions[i][1], 0]) children();
      translate([holePositions[i2][0], holePositions[i2][1], 0]) children();
    }
  }
}

module holePositions() {
  for (i = [ 0 : len(holePositions) - 1 ] ) {
    translate([holePositions[i][0], holePositions[i][1], 0]) children();
  }
}

module holeRing() {
  difference() {
    cylinder(r=holeR+wt,h=wt*2);
    hole();
  }
}

module hole() {
  translate([0,0,-0.5]) cylinder(r=holeR,h=wt*2+1);
}




module hexGrid(hr,d,h,renderCells) {
  for (i = [ 0 : len(renderCells) - 1 ] ) {
    x = renderCells[i][0];
    y = renderCells[i][1];
    difference() {
      hexPositioned(hr+d,-d,h,x,y);
      translate([0,0,-0.1]) hexPositioned(hr,d,h+0.2,x,y);
    }
  }
}

module hexPositioned(hr,d,h,ix,iy) {
  cr=circumradius(hr);
  even=abs(ix%2);
  translate([(hr+d/2)*sqrt(3)*ix,(hr+d/2)*even,0]) translate([0,(hr*2+d)*iy,0]) cylinder(r=cr,h=h,$fn=6);
}

function circumradius(hr) = hr/(sqrt(3)/2);
